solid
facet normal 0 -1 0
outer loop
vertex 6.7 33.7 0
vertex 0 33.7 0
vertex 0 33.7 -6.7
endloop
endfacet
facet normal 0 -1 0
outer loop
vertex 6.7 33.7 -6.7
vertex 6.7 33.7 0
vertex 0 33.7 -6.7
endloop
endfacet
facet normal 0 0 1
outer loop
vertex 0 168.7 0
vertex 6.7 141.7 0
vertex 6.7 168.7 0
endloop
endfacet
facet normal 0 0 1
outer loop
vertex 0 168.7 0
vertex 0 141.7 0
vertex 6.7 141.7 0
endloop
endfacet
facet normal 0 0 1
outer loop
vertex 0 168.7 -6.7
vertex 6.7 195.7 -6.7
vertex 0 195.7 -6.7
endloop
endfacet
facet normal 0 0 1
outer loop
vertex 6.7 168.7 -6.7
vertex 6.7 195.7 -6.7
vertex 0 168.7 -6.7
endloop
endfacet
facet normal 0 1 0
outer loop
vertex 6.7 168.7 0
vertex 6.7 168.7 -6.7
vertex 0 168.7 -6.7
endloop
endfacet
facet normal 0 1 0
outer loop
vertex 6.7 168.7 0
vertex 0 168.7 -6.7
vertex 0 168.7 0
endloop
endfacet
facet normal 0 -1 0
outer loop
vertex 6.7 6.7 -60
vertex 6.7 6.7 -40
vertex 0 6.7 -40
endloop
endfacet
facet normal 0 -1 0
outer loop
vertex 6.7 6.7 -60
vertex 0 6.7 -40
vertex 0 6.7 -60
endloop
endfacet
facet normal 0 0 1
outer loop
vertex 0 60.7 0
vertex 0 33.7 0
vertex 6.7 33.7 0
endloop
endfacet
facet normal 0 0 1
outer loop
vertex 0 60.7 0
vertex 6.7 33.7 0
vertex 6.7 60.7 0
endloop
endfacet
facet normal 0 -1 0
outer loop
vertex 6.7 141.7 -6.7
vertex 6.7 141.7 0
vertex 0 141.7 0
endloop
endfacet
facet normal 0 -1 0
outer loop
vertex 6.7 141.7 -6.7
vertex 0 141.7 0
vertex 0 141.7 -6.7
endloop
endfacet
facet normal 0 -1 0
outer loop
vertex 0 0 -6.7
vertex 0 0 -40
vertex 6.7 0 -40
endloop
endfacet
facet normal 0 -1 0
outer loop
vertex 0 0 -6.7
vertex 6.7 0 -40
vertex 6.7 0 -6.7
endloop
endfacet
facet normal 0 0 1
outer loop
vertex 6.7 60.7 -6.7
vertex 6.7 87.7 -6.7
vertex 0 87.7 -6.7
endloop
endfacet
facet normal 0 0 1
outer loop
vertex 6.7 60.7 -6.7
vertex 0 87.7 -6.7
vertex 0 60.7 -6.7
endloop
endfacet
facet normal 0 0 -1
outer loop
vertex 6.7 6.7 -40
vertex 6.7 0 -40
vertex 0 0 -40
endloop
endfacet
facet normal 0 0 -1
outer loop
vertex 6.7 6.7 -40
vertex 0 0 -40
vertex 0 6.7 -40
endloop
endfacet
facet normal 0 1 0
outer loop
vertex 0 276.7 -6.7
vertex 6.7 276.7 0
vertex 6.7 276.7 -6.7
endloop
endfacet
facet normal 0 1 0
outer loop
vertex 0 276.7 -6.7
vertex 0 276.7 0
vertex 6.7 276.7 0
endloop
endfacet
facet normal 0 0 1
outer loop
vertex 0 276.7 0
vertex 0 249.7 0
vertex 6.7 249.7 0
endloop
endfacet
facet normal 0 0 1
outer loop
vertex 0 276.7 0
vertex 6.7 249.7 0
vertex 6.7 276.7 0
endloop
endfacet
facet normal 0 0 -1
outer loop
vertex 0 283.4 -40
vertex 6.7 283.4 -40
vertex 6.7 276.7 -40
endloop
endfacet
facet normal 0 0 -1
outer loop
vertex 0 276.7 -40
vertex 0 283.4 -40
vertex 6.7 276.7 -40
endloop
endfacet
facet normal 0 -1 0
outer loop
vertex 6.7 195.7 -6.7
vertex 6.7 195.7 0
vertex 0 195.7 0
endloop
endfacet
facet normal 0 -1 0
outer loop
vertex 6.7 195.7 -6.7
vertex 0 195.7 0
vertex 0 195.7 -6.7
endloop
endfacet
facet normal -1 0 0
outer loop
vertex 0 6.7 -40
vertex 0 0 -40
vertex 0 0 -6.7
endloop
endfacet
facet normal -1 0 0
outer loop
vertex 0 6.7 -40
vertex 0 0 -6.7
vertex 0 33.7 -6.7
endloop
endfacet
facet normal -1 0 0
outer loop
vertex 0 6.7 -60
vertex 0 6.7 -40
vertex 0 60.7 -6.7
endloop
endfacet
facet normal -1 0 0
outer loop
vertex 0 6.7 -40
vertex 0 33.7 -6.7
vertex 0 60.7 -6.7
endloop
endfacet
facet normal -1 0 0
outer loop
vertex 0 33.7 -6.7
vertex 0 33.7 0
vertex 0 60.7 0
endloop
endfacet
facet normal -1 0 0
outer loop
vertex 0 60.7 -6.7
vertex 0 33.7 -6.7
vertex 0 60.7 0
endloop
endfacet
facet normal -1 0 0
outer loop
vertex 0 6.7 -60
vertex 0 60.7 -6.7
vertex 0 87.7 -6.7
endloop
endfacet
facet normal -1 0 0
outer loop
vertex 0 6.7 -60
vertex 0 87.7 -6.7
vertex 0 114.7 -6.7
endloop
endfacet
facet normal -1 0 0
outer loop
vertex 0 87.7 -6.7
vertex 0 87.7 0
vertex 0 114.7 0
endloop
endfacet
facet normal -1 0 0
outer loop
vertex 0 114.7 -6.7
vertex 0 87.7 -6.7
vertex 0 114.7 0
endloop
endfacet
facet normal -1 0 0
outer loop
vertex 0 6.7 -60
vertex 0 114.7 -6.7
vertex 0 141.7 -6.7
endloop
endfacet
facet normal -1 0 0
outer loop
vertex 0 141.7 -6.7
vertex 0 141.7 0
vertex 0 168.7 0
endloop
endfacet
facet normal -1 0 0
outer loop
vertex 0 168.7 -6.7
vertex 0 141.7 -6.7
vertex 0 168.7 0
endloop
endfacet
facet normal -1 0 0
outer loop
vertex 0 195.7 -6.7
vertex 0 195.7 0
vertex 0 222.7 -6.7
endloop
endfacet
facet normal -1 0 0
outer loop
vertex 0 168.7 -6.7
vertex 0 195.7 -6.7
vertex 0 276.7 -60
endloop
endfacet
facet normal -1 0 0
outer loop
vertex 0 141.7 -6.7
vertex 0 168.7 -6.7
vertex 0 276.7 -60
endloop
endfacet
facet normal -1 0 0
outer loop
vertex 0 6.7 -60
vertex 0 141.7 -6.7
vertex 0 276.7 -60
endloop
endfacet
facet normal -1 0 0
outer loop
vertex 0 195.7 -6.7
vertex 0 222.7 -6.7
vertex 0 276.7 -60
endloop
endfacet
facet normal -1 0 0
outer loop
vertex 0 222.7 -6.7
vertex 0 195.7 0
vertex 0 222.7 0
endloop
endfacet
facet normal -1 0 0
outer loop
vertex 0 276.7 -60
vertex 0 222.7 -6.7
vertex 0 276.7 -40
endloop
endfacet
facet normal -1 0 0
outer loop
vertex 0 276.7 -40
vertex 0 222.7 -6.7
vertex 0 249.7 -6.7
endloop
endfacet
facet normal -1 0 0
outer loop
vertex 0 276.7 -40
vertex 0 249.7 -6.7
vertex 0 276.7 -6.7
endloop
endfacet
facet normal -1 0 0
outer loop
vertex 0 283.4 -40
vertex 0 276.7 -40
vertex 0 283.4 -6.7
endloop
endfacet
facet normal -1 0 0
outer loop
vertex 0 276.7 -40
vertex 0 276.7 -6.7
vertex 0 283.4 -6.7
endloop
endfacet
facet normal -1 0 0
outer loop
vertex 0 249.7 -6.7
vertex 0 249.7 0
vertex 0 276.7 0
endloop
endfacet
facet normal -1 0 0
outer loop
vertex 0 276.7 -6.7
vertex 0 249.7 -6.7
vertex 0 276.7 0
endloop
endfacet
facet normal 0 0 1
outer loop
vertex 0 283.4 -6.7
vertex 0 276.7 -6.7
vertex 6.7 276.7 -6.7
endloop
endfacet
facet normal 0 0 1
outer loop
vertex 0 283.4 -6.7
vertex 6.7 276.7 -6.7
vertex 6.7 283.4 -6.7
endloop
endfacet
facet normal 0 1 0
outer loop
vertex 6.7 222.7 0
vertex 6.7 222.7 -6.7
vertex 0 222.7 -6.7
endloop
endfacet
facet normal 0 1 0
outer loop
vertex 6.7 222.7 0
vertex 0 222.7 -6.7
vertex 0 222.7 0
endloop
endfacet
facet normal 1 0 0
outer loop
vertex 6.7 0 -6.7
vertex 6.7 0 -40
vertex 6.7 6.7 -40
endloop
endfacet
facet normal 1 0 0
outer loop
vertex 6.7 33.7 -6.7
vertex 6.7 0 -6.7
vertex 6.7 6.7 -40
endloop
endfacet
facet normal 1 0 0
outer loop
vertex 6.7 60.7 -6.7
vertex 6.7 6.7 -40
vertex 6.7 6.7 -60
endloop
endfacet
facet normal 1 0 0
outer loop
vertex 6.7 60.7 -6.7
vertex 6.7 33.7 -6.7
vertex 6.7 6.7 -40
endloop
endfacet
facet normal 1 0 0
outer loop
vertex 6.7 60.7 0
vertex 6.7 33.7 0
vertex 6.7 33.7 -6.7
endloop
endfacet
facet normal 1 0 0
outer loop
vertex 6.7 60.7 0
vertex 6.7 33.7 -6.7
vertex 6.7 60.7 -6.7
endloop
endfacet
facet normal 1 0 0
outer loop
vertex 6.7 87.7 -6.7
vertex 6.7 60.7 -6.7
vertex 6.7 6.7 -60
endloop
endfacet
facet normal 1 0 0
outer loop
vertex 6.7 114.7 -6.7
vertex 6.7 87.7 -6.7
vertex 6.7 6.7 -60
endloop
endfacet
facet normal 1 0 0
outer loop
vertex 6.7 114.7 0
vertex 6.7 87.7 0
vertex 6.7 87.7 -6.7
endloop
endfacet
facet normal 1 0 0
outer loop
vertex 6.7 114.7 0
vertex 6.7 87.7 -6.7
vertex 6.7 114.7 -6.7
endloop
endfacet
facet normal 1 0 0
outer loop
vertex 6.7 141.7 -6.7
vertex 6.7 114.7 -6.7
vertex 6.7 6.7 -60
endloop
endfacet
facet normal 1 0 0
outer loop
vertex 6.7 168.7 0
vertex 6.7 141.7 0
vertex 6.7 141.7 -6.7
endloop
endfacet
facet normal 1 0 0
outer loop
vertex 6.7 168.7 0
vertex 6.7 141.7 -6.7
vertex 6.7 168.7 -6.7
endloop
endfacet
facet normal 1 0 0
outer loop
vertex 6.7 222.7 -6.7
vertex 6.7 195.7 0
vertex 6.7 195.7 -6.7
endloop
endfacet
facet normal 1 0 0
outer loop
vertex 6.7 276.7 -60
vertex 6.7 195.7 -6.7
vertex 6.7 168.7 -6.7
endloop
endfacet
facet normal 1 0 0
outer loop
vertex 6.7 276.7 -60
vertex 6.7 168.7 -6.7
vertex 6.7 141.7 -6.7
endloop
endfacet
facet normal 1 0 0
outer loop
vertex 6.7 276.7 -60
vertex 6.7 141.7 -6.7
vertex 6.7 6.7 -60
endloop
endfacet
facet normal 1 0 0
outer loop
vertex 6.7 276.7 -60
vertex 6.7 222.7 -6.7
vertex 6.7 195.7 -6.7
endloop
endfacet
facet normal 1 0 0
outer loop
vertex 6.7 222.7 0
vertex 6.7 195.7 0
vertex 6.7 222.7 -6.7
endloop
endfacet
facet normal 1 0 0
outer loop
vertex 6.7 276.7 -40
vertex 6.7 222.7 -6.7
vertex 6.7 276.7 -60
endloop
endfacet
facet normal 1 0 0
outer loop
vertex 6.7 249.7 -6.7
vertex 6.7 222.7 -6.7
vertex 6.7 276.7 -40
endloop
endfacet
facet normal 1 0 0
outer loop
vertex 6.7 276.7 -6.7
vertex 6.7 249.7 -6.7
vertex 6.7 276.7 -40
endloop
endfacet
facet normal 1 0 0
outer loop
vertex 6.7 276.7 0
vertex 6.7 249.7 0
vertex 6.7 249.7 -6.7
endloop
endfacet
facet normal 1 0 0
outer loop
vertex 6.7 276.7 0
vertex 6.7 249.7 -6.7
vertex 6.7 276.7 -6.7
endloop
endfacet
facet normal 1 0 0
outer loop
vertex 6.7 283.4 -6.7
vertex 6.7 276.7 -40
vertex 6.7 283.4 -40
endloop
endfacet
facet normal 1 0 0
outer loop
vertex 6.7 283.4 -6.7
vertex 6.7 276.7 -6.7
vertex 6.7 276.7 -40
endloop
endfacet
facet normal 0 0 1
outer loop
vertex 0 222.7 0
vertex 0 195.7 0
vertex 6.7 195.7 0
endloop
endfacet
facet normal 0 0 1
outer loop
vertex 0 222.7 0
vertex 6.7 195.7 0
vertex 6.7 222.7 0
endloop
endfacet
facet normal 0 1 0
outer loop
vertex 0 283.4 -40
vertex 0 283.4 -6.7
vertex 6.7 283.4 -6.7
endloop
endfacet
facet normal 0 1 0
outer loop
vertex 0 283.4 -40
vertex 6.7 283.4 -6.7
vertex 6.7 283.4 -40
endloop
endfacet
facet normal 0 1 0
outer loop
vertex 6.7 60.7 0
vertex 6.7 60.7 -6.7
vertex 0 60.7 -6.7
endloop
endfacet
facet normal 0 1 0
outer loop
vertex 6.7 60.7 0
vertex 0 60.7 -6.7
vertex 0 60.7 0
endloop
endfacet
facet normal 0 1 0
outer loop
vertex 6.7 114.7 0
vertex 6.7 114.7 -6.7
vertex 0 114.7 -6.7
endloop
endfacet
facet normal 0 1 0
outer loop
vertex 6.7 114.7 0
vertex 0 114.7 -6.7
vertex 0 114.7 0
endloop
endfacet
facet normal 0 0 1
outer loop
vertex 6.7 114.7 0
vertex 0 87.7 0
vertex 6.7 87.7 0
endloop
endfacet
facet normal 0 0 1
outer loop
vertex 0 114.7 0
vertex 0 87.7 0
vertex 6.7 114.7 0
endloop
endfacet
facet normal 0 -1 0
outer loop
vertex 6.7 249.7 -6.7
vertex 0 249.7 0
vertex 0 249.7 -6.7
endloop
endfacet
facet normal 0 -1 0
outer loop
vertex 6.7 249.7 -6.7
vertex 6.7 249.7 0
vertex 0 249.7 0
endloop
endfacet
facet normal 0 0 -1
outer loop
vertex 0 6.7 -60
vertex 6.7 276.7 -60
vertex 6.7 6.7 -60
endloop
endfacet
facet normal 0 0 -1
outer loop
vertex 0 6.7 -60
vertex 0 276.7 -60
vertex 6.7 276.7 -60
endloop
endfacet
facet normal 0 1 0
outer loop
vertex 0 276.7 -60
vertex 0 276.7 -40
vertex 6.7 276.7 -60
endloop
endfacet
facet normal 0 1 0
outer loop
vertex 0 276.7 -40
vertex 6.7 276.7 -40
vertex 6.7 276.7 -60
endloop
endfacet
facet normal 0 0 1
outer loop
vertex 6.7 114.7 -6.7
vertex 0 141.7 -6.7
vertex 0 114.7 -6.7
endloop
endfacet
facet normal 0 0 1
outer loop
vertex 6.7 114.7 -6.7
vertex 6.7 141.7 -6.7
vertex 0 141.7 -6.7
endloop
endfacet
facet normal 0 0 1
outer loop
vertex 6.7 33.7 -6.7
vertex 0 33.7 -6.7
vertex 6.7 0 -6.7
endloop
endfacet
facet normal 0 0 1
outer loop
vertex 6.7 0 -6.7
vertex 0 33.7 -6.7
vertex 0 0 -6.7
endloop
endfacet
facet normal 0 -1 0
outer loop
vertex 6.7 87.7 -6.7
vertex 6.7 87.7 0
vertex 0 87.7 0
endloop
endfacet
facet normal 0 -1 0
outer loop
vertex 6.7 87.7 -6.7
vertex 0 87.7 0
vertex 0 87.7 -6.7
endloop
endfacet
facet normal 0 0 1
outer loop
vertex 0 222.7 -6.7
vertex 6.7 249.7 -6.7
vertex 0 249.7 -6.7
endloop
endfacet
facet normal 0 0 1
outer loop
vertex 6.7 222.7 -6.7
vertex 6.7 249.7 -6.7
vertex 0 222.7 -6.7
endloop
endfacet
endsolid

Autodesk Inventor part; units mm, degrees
ref_plane "YZ Plane" through (0, 0, 0) normal (1, 0, 0) x (0, 1, 0)
ref_plane "XZ Plane" through (0, 0, 0) normal (0, 1, 0) x (-1, 0, 0)
ref_plane "XY Plane" through (0, 0, 0) normal (0, 0, 1) x (1, 0, 0)
sketch "Sketch1" plane through (0, 0, 0) normal (1, 0, 0) x (0, 1, 0)
  line L0 (33.7, 0) -> (276.7, 0)
  line L1 (283.4, -6.7) -> (283.4, -60)
  line L2 (283.4, -60) -> (0, -60)
  line L3 (0, -60) -> (0, -6.7)
  line L4 (276.7, 0) -> (276.7, -6.7)
  line L5 (276.7, -6.7) -> (283.4, -6.7)
  line L6 (33.7, 0) -> (33.7, -6.7)
  line L7 (33.7, -6.7) -> (0, -6.7)
  point P0 (0, 0)
  dimension "d0" = 283.4
  dimension "d2" = 6.7
  dimension "d3" = 6.7
  dimension "d4" = 33.7
  dimension "d5" = 6.7
extrude "Extrusion1" add sketch "Sketch1" along normal blind 6.7
sketch "Sketch2" plane through (6.7, 0, 0) normal (1, 0, 0) x (0, 0, -1)
  line L0 (6.7, 276.7) -> (0, 276.7) projected
  line L1 (0, 276.7) -> (0, 249.7)
  line L2 (0, 276.7) -> (0, 33.7) projected
  line L3 (0, 249.7) -> (6.7, 249.7)
  line L4 (6.7, 249.7) -> (6.7, 222.7)
  line L5 (6.7, 222.7) -> (0, 222.7)
  line L6 (0, 222.7) -> (0, 249.7)
  point P0 (0, 0)
  dimension "d8" = 27
  dimension "d9" = 6.7
  dimension "d10" = 27
extrude "Extrusion2" cut sketch "Sketch2" against normal blind 6.7
pattern_linear "Rectangular Pattern1" count 4 spacing 54 along (0, -1, 0) of "Extrusion2"
sketch "Sketch3" plane through (6.7, 0, 0) normal (1, 0, 0) x (0, 0, -1)
  line L0 (60, 0) -> (60, 283.4) projected
  line L1 (60, 283.4) -> (40, 283.4)
  line L2 (40, 283.4) -> (40, 276.7)
  line L3 (40, 276.7) -> (60, 276.7)
  line L4 (60, 276.7) -> (60, 283.4)
  line L5 (60, 0) -> (40, 0)
  line L6 (40, 0) -> (40, 6.7)
  line L7 (40, 6.7) -> (60, 6.7)
  line L8 (60, 6.7) -> (60, 0)
  point P0 (0, 0)
  dimension "d16" = 20
  dimension "d17" = 20
  dimension "d18" = 6.7
  dimension "d19" = 6.7
extrude "Extrusion3" cut sketch "Sketch3" against normal blind 6.7
properties part number "b_base_support 2"
